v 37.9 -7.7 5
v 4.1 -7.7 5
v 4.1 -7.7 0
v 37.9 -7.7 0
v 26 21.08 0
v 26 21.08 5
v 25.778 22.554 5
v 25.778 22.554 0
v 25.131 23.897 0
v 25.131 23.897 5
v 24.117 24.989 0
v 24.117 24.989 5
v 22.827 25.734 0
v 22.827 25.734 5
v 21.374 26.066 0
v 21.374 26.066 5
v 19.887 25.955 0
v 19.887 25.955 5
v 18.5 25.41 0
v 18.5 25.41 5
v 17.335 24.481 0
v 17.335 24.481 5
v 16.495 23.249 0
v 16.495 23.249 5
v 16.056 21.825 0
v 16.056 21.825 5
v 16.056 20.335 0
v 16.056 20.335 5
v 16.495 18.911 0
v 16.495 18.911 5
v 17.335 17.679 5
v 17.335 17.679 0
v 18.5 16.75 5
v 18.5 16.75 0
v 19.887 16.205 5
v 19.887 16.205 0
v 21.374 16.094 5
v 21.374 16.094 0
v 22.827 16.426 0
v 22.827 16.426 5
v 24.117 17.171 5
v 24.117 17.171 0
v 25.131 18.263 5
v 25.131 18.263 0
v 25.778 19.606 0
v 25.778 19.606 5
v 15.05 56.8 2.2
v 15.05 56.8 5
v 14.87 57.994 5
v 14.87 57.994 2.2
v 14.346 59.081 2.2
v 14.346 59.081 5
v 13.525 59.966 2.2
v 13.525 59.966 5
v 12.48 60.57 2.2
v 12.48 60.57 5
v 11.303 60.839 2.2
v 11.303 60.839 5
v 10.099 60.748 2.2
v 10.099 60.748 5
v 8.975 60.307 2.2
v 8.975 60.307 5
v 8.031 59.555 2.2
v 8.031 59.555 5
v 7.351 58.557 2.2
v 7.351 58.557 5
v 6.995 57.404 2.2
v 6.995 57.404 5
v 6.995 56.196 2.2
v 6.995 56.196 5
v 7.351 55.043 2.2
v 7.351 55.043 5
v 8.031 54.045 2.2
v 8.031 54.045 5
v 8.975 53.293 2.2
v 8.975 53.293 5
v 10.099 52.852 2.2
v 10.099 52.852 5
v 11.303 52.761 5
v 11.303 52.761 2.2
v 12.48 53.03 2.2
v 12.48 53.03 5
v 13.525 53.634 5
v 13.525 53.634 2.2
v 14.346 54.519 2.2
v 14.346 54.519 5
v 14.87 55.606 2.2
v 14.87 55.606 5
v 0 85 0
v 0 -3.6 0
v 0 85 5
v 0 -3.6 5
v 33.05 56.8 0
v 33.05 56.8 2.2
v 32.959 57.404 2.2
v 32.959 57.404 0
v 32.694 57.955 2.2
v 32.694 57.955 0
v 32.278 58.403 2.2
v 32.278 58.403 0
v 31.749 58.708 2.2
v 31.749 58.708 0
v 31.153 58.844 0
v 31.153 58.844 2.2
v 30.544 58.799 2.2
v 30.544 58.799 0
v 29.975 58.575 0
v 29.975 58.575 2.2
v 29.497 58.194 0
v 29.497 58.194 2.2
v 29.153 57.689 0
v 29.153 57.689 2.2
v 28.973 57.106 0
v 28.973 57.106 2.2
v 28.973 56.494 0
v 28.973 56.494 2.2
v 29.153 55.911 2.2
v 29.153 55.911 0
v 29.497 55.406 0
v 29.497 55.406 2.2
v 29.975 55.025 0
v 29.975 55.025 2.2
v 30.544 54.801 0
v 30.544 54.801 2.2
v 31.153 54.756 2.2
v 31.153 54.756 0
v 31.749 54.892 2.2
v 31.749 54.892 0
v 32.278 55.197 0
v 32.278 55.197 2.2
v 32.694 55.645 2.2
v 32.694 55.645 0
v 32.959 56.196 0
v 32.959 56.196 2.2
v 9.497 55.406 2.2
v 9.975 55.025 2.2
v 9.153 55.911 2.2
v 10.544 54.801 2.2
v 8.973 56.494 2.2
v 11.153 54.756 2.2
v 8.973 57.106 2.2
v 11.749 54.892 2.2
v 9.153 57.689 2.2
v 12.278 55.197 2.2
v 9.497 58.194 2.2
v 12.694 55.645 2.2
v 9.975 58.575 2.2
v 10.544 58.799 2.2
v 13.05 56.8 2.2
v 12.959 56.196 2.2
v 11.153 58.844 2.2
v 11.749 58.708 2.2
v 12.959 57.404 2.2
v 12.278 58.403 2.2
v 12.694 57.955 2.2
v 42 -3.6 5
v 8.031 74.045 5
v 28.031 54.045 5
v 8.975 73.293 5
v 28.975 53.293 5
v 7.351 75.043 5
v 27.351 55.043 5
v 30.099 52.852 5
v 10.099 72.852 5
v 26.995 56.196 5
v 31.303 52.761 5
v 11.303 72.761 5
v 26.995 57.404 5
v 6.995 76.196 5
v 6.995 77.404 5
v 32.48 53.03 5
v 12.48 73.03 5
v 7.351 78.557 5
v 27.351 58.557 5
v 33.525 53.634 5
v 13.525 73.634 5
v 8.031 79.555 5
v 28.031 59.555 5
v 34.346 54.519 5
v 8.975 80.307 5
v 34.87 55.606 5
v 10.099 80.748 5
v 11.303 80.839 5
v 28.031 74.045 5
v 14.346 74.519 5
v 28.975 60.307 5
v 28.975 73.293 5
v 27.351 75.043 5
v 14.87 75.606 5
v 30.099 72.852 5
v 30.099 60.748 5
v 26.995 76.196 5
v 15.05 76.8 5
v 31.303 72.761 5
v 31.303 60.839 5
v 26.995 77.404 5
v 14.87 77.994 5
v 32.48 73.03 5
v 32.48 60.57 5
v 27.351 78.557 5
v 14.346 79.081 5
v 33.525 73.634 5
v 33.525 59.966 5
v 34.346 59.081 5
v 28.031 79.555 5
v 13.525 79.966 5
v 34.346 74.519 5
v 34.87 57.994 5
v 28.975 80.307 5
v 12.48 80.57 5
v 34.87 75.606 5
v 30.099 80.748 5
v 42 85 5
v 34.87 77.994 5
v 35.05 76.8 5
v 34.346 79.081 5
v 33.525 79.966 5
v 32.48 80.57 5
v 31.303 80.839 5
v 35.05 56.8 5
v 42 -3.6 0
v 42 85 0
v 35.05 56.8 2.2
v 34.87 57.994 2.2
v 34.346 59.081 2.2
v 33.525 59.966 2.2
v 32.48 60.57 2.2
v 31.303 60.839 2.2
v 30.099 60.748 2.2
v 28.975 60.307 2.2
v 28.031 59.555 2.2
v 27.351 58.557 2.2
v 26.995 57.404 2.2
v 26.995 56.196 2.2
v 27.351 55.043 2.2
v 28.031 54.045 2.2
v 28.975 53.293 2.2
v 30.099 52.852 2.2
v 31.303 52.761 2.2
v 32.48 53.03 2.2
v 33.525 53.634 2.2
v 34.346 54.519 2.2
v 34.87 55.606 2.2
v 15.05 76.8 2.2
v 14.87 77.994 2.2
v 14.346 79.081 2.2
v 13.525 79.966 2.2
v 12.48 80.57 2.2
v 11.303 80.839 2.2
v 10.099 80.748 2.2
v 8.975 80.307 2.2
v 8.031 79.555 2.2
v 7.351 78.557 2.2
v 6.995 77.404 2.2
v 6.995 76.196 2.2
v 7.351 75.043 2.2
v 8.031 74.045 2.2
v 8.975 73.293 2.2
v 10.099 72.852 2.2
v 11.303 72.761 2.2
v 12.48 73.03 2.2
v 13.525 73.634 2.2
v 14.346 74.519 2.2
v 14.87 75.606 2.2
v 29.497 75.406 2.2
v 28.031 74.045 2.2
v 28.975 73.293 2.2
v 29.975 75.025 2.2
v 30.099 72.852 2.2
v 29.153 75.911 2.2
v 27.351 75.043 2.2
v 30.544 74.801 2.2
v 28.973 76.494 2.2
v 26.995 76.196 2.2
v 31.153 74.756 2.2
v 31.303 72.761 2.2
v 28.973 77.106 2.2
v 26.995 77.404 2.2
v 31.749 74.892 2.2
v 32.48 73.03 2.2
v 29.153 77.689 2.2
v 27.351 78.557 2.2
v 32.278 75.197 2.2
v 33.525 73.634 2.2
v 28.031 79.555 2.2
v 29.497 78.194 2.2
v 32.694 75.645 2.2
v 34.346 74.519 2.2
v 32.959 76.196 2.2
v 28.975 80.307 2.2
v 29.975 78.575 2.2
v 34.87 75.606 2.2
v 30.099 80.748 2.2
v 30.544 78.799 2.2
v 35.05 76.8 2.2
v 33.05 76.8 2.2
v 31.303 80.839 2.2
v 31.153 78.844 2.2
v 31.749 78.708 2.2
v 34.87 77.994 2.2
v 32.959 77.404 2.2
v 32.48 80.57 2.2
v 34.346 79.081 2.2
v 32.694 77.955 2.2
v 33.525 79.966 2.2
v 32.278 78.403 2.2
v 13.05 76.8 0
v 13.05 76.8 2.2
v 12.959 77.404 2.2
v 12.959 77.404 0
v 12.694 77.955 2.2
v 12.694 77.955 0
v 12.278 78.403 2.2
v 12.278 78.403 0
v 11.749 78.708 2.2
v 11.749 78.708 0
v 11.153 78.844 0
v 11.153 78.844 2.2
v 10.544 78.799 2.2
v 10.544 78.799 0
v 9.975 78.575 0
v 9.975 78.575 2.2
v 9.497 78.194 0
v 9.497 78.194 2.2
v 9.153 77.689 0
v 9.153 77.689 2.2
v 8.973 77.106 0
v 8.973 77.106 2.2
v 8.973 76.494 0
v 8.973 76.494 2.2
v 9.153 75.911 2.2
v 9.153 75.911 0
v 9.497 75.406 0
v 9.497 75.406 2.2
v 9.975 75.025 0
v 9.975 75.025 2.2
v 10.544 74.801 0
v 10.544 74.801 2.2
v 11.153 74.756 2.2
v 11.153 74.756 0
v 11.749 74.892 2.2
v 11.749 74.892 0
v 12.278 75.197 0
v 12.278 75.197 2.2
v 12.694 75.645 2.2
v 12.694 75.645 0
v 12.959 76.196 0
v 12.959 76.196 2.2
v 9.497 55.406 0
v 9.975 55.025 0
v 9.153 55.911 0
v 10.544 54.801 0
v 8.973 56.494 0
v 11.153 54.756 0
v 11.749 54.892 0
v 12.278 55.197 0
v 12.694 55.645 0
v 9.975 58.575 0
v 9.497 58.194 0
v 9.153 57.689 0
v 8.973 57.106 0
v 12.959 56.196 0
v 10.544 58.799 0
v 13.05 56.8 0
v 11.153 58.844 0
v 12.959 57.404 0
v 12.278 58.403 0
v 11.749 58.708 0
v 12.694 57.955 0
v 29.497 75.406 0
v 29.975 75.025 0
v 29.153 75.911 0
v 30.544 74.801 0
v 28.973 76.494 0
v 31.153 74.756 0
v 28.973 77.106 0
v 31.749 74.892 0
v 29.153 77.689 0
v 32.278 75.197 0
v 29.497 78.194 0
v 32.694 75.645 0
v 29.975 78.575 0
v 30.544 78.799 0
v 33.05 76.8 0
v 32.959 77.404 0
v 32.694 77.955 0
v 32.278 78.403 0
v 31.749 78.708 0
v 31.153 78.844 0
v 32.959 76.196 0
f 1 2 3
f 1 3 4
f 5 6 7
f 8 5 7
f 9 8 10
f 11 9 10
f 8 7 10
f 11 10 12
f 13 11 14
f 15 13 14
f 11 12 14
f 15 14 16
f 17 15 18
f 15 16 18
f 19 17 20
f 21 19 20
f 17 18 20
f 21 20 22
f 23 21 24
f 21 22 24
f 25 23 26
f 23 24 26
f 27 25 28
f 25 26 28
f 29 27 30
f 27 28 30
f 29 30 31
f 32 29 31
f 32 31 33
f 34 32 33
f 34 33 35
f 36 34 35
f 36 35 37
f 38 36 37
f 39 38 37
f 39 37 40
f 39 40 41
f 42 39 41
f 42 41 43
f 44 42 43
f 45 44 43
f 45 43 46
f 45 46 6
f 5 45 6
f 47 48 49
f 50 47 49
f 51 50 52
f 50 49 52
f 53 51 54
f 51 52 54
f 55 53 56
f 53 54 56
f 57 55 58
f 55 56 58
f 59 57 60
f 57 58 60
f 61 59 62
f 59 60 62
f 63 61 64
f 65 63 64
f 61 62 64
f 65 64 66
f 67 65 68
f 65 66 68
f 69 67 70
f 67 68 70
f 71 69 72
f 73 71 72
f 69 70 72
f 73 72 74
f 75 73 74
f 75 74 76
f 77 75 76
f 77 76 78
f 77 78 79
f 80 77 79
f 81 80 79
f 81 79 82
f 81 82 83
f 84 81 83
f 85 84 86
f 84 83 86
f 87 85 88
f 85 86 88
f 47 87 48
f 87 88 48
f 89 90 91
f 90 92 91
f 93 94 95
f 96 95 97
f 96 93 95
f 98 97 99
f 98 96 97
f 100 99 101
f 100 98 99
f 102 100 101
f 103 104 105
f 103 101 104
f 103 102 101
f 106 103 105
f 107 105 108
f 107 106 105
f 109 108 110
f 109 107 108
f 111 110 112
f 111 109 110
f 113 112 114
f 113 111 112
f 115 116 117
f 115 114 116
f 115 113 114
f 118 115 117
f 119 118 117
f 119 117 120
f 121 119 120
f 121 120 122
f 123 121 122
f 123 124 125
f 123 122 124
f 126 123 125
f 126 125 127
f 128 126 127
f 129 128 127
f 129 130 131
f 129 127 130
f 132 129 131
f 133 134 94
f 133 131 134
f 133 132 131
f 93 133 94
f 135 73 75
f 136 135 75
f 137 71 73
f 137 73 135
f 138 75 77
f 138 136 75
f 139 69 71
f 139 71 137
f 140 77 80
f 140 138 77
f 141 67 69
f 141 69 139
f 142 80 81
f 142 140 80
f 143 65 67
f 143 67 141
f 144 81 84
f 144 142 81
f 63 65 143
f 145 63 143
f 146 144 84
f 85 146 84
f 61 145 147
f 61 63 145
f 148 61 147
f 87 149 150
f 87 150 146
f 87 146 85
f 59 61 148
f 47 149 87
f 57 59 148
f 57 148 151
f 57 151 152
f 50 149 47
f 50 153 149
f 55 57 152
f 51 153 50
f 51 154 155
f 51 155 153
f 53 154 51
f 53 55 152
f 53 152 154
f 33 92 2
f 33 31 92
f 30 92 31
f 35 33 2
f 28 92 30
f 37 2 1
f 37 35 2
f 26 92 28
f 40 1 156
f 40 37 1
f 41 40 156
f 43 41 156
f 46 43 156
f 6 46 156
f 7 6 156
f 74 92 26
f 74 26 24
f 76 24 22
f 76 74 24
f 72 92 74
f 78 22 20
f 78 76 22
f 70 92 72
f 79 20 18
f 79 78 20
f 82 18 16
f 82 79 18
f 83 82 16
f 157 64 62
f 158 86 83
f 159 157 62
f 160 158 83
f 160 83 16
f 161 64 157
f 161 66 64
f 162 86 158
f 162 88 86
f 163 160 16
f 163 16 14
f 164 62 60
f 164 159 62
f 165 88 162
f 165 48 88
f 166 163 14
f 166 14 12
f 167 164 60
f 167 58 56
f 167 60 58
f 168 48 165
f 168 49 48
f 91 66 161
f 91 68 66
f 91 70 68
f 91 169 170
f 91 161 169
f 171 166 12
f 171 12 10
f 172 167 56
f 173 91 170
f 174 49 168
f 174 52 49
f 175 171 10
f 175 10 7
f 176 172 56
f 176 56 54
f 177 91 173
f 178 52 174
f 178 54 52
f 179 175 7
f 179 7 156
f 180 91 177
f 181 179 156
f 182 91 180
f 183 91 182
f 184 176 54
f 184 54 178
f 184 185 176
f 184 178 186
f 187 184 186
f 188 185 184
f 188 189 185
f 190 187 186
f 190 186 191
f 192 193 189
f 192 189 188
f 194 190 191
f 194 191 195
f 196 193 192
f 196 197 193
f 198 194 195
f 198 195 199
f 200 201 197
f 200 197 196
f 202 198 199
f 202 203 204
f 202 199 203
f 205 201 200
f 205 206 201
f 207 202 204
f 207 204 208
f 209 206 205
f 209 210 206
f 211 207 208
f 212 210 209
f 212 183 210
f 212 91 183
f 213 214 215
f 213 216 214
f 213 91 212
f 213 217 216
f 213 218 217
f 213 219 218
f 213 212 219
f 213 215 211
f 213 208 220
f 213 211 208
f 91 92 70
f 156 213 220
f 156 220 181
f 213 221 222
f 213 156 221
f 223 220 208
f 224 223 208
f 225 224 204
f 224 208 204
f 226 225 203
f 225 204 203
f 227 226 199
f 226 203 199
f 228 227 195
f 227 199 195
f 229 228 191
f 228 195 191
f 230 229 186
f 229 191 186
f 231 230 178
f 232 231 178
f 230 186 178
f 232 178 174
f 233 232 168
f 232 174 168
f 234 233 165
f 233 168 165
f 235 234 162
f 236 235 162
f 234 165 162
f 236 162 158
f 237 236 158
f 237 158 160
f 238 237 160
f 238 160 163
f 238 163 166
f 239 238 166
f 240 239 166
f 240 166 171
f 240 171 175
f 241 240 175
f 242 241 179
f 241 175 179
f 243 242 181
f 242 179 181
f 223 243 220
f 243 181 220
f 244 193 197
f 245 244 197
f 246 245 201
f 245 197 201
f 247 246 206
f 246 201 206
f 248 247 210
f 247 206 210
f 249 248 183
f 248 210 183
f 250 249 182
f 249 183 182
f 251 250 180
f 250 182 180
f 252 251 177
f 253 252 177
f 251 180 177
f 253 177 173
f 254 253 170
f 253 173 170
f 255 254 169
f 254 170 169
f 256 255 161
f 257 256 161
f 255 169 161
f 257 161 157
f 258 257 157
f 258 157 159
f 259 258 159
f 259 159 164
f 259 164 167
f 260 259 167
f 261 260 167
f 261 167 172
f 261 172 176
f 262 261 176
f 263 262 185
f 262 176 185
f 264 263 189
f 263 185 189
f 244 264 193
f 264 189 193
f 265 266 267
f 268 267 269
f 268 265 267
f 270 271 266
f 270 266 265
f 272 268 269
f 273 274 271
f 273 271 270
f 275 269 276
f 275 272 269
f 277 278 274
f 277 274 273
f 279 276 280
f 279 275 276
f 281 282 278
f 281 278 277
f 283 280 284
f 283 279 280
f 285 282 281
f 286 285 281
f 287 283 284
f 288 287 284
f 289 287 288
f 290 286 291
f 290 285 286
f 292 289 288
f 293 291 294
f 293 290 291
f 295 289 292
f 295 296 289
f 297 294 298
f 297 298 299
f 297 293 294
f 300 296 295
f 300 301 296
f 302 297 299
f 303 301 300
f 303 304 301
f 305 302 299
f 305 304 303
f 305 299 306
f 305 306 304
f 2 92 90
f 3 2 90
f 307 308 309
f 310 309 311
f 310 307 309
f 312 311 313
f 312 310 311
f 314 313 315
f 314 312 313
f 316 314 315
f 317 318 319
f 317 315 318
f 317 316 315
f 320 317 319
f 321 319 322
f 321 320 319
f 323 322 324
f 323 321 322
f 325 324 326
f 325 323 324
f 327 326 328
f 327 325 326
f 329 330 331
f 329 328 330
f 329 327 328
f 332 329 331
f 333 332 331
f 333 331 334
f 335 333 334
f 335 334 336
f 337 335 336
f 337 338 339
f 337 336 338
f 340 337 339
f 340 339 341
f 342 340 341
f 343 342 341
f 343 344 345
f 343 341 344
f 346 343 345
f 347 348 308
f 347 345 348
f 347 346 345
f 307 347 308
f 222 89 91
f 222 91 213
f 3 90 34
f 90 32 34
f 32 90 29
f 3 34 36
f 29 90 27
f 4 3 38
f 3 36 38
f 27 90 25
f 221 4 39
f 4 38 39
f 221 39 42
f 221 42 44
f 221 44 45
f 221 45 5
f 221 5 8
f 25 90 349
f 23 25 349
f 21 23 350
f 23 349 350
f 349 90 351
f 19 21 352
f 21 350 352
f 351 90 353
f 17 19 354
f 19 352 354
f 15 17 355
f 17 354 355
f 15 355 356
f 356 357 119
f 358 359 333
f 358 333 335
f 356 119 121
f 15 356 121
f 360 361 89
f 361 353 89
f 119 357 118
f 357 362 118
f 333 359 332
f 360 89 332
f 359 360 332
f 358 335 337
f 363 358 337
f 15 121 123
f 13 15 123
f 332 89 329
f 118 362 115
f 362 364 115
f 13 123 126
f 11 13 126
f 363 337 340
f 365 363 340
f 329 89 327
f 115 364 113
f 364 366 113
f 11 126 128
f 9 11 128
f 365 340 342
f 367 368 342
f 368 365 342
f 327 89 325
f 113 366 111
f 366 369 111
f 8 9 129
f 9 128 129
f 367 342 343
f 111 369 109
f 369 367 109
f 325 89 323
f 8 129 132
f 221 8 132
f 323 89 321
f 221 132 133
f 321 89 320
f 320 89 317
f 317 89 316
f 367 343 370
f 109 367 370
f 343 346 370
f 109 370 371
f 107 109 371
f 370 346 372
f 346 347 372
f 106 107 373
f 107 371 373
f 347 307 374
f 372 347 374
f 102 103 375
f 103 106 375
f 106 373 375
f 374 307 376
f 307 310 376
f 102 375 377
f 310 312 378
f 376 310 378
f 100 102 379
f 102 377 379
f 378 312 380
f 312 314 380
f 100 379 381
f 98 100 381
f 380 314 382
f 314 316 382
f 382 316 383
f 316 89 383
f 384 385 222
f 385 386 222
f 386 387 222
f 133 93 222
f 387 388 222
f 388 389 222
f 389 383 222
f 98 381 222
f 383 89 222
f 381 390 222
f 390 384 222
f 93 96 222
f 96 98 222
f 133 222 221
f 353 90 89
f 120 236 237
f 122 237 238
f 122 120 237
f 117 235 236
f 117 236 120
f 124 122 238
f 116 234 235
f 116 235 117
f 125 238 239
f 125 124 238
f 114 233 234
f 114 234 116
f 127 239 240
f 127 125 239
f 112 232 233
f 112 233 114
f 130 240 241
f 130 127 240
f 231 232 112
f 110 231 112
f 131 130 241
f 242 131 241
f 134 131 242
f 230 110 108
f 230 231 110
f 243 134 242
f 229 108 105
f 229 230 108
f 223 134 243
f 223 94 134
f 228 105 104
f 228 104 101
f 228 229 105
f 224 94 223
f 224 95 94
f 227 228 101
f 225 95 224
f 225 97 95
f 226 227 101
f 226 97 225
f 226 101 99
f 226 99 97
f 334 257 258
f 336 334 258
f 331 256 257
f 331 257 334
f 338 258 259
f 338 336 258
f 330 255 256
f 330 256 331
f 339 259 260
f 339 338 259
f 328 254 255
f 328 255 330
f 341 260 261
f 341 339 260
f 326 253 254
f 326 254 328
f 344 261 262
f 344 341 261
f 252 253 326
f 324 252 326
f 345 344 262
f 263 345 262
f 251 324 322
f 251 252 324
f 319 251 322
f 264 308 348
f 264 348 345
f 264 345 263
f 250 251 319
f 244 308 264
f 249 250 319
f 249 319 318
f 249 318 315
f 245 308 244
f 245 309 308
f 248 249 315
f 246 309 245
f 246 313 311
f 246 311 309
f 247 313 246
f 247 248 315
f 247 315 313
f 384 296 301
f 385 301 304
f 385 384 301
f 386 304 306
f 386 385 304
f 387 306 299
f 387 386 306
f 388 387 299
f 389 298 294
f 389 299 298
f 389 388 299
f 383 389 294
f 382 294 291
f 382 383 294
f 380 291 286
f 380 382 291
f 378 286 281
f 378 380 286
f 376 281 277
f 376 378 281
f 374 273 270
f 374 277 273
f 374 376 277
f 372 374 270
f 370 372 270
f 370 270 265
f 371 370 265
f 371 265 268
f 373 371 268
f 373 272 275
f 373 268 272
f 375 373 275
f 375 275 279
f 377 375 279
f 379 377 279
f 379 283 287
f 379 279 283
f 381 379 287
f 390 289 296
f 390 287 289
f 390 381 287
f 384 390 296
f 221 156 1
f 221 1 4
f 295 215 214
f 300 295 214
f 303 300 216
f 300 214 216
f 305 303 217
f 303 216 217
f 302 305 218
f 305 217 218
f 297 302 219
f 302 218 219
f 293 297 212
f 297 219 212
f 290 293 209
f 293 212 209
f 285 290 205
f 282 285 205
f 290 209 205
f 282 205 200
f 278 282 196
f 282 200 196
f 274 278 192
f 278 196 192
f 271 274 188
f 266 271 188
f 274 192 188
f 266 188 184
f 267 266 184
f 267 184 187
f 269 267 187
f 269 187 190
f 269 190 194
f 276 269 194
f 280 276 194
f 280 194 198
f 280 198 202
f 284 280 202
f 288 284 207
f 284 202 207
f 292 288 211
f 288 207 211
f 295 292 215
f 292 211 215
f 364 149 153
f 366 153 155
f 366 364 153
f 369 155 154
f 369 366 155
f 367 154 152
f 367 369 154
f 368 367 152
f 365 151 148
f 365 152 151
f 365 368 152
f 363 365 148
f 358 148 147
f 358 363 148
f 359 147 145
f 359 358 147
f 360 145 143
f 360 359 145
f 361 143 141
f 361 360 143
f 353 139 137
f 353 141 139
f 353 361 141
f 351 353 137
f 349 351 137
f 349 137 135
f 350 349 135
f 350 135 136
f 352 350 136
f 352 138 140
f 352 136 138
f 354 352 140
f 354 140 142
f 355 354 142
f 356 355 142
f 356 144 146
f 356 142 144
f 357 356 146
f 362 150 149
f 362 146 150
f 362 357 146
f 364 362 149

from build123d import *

# Parameters (mm, degrees)
CROQUIS1_W              = 42
CROQUIS1_H              = 85
CROQUIS1_R              = 2.05
SALIENTE_EXTRUIR1_DEPTH = 5
CROQUIS4_R              = 4.05
CORTAR_EXTRUIR1_DEPTH   = 2.8
CROQUIS7_R              = 5
CORTAR_EXTRUIR4_DEPTH   = 6
CROQUIS8_W              = 42
CROQUIS8_H              = 7.7
SALIENTE_EXTRUIR2_DEPTH = 5
CHAFL_N1_SIZE           = 4.1


with BuildPart() as part:
    # Croquis1 → Saliente-Extruir1 (new body)
    with BuildSketch(Plane.XY):
        with Locations((21, 42.5)):
            Rectangle(CROQUIS1_W, CROQUIS1_H)
        with Locations((11, 76.8)):
            Circle(CROQUIS1_R, mode=Mode.SUBTRACT)
        with Locations((31, 76.8)):
            Circle(CROQUIS1_R, mode=Mode.SUBTRACT)
        with Locations((31, 56.8)):
            Circle(CROQUIS1_R, mode=Mode.SUBTRACT)
        with Locations((11, 56.8)):
            Circle(CROQUIS1_R, mode=Mode.SUBTRACT)
    extrude(amount=SALIENTE_EXTRUIR1_DEPTH)

    # Croquis4 → Cortar-Extruir1 (cut)
    with BuildSketch(Plane.XY.offset(5)):
        with Locations((11, 76.8)):
            Circle(CROQUIS4_R)
        with Locations((11, 56.8)):
            Circle(CROQUIS4_R)
        with Locations((31, 56.8)):
            Circle(CROQUIS4_R)
        with Locations((31, 76.8)):
            Circle(CROQUIS4_R)
    extrude(amount=-CORTAR_EXTRUIR1_DEPTH, mode=Mode.SUBTRACT)

    # Croquis7 → Cortar-Extruir4 (cut, through all)
    with BuildSketch(Plane.XY.offset(5)):
        with Locations((21, 21.08)):
            Circle(CROQUIS7_R)
    extrude(amount=-CORTAR_EXTRUIR4_DEPTH, mode=Mode.SUBTRACT)

    # Croquis8 → Saliente-Extruir2 (add, through all)
    with BuildSketch(Plane.XY.offset(5)):
        with Locations((21, -3.85)):
            Rectangle(CROQUIS8_W, CROQUIS8_H)
    extrude(amount=-SALIENTE_EXTRUIR2_DEPTH)

    # Chaflán1
    chafl_n1_edges = [part.edges().sort_by_distance(p)[0] for p in [
        (0, -7.7, 2.5),
        (42, -7.7, 2.5),
    ]]
    chamfer(chafl_n1_edges, length=CHAFL_N1_SIZE)


solid = part.part
